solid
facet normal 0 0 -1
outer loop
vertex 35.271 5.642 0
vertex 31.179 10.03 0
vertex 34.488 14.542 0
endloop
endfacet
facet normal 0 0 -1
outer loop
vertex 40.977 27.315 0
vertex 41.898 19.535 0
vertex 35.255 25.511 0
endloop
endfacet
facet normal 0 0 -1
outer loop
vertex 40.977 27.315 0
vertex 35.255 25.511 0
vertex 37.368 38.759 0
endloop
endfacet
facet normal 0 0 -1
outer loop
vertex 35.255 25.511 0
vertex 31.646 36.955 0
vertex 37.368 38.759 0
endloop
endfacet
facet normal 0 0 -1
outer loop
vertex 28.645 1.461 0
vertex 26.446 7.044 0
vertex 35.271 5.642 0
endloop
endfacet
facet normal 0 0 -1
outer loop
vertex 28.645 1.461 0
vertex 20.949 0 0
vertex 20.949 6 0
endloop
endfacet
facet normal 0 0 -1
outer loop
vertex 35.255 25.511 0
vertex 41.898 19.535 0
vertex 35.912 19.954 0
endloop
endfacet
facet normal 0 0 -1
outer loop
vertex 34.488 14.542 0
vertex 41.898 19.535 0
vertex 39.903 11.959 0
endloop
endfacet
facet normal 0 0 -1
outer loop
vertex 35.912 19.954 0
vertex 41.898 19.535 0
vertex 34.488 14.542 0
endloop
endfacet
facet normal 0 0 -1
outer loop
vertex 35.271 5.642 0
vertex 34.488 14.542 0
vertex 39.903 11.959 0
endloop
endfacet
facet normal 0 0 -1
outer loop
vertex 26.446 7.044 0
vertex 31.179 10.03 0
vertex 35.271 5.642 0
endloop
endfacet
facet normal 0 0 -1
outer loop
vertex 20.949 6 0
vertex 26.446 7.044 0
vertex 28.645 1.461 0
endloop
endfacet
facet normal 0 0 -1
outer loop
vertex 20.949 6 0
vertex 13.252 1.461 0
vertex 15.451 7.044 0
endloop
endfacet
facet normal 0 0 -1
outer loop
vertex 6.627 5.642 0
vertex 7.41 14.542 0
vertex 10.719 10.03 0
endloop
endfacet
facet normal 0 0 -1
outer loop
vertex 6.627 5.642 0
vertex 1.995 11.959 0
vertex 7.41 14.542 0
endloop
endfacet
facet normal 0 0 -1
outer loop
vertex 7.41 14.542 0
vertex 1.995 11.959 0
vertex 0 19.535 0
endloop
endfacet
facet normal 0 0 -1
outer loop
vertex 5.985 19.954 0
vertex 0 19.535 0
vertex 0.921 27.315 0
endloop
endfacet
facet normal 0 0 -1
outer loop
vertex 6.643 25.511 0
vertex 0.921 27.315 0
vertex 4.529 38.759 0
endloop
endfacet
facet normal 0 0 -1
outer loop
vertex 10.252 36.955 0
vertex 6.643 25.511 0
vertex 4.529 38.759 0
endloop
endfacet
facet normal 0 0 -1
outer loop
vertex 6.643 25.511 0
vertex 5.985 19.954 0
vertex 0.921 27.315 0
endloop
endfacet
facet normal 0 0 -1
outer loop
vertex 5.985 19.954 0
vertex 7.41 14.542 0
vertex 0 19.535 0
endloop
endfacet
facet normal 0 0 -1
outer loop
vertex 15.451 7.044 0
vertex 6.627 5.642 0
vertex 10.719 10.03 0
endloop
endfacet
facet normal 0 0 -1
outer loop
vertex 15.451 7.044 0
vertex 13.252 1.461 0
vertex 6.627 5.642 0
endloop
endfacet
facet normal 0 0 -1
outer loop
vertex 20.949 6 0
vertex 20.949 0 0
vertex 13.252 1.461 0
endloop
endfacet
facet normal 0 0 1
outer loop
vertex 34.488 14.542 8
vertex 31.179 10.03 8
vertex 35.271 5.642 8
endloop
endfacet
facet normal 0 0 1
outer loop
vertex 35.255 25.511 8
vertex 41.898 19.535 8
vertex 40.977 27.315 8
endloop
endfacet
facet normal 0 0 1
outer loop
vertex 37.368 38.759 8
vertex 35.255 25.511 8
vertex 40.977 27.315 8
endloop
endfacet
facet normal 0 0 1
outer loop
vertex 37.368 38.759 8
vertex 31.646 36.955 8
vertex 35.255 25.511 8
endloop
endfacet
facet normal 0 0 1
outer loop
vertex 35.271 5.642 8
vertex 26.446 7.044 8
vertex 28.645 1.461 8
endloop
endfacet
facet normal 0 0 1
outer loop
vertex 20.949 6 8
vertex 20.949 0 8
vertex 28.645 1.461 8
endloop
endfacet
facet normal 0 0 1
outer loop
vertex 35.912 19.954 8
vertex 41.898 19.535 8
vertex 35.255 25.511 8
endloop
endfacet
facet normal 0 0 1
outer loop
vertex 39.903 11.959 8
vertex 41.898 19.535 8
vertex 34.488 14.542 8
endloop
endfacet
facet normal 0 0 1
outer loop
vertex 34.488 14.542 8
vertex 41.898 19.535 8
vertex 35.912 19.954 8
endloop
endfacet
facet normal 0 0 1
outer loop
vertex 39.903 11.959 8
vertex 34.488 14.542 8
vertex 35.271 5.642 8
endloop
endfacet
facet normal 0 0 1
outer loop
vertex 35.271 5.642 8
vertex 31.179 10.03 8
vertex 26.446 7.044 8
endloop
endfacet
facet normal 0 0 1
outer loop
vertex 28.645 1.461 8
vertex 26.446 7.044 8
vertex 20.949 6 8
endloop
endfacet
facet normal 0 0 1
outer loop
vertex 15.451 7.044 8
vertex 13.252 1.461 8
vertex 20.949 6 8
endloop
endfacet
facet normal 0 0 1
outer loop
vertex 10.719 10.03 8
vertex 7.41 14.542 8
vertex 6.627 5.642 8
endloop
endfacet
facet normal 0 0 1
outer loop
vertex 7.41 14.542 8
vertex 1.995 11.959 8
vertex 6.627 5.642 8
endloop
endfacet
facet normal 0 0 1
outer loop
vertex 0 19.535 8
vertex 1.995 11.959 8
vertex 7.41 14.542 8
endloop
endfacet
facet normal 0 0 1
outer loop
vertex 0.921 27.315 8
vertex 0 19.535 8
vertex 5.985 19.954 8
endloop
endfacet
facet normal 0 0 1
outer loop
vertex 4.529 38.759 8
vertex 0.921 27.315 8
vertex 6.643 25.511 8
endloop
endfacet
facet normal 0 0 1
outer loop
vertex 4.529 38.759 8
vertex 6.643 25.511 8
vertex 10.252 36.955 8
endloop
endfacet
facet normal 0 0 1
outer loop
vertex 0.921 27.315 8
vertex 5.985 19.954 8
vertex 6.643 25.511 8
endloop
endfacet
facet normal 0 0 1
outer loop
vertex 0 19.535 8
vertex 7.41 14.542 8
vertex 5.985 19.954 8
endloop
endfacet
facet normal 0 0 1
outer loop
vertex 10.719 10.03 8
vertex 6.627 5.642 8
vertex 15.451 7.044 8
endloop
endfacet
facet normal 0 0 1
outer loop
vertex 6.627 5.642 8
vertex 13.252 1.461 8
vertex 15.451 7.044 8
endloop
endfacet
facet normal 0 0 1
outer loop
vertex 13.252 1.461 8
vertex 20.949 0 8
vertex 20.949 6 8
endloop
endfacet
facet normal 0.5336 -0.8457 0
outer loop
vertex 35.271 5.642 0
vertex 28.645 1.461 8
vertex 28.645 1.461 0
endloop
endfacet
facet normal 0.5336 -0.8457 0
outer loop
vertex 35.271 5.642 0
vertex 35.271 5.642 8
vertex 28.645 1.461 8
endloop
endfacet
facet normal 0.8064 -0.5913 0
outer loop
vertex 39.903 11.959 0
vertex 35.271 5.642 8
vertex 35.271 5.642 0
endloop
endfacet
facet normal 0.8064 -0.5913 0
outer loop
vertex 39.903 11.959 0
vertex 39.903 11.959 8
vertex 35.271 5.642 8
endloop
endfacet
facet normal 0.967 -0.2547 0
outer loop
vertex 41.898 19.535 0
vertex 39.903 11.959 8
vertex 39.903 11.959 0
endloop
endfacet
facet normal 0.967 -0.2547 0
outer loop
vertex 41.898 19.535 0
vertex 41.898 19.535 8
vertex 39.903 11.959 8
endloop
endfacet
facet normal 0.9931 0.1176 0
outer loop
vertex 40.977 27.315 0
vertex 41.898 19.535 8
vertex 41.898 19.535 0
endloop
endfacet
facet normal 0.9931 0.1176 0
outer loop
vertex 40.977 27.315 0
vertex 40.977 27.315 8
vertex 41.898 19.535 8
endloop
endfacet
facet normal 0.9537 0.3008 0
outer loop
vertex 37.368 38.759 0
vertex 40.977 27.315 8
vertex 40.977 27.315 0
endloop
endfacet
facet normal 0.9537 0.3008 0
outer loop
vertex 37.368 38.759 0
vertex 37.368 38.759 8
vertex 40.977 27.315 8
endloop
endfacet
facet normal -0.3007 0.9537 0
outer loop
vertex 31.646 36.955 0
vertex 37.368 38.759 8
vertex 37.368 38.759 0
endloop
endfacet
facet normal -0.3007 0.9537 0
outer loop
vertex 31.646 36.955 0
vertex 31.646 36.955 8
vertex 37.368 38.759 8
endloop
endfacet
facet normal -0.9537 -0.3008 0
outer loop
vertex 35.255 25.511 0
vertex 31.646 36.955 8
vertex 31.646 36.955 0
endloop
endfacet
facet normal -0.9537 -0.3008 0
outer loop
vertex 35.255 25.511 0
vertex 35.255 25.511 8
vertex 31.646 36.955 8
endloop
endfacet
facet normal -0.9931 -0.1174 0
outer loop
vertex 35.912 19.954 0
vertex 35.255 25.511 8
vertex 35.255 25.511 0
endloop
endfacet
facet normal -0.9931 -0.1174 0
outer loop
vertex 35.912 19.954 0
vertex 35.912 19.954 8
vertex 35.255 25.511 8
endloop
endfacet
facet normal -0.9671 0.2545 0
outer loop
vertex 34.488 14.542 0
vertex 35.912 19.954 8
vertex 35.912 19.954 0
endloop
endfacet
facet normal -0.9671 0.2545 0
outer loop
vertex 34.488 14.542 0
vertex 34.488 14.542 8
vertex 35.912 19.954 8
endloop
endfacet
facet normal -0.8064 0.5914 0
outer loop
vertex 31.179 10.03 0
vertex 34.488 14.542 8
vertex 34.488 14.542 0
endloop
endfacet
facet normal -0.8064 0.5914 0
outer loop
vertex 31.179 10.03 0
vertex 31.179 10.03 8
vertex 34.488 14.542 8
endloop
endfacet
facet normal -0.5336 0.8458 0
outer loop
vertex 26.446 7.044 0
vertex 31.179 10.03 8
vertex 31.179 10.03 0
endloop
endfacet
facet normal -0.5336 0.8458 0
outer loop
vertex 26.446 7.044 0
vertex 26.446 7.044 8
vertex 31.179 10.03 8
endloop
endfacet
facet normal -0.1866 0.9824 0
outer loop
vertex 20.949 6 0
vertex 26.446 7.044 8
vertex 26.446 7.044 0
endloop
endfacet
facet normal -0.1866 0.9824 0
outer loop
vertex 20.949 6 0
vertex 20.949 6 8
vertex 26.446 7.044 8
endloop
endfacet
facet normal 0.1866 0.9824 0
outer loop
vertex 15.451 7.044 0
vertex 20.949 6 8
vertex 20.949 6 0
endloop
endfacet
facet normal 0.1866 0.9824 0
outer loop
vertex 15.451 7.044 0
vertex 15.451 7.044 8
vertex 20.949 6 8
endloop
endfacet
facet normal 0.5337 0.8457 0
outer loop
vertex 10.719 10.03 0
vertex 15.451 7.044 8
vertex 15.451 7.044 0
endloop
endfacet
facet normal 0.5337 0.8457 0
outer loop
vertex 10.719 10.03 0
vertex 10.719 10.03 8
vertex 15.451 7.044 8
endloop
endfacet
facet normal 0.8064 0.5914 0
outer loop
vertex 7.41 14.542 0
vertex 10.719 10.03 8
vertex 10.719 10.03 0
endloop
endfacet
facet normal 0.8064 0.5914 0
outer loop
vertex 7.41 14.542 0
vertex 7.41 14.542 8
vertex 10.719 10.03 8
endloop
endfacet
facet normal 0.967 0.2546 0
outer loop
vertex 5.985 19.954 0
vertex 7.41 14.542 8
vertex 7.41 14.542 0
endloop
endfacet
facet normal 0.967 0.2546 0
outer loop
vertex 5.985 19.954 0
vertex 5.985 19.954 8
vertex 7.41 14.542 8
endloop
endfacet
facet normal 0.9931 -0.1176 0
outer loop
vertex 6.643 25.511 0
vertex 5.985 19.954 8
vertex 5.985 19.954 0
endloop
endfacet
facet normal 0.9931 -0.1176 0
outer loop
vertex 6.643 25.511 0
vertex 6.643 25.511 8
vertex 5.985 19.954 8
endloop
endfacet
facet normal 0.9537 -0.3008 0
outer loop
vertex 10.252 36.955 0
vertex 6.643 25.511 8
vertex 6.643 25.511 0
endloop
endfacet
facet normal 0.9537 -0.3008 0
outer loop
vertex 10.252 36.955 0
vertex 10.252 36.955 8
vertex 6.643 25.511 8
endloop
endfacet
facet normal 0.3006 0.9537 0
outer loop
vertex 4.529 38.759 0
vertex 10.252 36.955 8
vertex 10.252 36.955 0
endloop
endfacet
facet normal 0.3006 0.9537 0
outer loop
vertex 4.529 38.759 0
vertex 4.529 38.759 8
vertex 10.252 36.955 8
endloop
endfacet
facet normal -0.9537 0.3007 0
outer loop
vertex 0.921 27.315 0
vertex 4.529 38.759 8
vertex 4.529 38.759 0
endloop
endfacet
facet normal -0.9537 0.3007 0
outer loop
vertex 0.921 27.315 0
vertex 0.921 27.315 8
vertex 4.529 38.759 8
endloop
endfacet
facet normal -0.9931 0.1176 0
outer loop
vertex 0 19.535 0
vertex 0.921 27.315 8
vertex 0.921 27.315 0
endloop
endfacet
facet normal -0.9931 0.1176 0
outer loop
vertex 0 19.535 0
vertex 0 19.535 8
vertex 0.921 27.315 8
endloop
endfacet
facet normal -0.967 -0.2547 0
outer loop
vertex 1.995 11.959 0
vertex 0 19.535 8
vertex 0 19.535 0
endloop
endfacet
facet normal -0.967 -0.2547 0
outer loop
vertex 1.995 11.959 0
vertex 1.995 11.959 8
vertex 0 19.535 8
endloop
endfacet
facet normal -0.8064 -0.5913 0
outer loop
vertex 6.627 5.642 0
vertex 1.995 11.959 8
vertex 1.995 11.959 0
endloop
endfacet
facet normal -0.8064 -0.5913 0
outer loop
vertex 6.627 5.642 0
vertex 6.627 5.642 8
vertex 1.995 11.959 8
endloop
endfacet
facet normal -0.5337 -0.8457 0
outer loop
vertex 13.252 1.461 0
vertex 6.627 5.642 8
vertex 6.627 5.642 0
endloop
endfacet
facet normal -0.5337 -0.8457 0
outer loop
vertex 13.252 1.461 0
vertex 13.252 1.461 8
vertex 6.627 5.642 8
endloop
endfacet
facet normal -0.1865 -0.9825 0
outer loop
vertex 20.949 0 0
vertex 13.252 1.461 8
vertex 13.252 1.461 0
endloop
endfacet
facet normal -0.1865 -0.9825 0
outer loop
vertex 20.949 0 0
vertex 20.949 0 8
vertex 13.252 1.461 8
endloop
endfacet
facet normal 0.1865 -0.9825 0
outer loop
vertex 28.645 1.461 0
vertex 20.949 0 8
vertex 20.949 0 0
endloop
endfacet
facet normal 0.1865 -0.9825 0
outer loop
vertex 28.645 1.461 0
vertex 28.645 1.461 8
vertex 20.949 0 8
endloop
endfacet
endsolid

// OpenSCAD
$fn = 32;

// ----------------------------------------------------------------------
// Clip blank: omega clip, 8 mm thick
// ----------------------------------------------------------------------

// --- parameters (mm) ---
profile_height = 8;       // extrusion height
profile_points = 26;      // points of the closed outline

profile = [[0.921, 27.315], [0, 19.535], [1.995, 11.959], [6.627, 5.642], [13.252, 1.461], [20.949, 0], [28.645, 1.461], [35.271, 5.642], [39.903, 11.959], [41.898, 19.535], [40.977, 27.315], [37.368, 38.759], [31.646, 36.955], [35.255, 25.511], [35.912, 19.954], [34.488, 14.542], [31.179, 10.03], [26.446, 7.044], [20.949, 6], [15.451, 7.044], [10.719, 10.03], [7.41, 14.542], [5.985, 19.954], [6.643, 25.511], [10.252, 36.955], [4.529, 38.759]];  // single closed polygon, 26 points, counter clockwise

// --- the one profile operation ---
linear_extrude(height = profile_height) polygon(points = profile);
